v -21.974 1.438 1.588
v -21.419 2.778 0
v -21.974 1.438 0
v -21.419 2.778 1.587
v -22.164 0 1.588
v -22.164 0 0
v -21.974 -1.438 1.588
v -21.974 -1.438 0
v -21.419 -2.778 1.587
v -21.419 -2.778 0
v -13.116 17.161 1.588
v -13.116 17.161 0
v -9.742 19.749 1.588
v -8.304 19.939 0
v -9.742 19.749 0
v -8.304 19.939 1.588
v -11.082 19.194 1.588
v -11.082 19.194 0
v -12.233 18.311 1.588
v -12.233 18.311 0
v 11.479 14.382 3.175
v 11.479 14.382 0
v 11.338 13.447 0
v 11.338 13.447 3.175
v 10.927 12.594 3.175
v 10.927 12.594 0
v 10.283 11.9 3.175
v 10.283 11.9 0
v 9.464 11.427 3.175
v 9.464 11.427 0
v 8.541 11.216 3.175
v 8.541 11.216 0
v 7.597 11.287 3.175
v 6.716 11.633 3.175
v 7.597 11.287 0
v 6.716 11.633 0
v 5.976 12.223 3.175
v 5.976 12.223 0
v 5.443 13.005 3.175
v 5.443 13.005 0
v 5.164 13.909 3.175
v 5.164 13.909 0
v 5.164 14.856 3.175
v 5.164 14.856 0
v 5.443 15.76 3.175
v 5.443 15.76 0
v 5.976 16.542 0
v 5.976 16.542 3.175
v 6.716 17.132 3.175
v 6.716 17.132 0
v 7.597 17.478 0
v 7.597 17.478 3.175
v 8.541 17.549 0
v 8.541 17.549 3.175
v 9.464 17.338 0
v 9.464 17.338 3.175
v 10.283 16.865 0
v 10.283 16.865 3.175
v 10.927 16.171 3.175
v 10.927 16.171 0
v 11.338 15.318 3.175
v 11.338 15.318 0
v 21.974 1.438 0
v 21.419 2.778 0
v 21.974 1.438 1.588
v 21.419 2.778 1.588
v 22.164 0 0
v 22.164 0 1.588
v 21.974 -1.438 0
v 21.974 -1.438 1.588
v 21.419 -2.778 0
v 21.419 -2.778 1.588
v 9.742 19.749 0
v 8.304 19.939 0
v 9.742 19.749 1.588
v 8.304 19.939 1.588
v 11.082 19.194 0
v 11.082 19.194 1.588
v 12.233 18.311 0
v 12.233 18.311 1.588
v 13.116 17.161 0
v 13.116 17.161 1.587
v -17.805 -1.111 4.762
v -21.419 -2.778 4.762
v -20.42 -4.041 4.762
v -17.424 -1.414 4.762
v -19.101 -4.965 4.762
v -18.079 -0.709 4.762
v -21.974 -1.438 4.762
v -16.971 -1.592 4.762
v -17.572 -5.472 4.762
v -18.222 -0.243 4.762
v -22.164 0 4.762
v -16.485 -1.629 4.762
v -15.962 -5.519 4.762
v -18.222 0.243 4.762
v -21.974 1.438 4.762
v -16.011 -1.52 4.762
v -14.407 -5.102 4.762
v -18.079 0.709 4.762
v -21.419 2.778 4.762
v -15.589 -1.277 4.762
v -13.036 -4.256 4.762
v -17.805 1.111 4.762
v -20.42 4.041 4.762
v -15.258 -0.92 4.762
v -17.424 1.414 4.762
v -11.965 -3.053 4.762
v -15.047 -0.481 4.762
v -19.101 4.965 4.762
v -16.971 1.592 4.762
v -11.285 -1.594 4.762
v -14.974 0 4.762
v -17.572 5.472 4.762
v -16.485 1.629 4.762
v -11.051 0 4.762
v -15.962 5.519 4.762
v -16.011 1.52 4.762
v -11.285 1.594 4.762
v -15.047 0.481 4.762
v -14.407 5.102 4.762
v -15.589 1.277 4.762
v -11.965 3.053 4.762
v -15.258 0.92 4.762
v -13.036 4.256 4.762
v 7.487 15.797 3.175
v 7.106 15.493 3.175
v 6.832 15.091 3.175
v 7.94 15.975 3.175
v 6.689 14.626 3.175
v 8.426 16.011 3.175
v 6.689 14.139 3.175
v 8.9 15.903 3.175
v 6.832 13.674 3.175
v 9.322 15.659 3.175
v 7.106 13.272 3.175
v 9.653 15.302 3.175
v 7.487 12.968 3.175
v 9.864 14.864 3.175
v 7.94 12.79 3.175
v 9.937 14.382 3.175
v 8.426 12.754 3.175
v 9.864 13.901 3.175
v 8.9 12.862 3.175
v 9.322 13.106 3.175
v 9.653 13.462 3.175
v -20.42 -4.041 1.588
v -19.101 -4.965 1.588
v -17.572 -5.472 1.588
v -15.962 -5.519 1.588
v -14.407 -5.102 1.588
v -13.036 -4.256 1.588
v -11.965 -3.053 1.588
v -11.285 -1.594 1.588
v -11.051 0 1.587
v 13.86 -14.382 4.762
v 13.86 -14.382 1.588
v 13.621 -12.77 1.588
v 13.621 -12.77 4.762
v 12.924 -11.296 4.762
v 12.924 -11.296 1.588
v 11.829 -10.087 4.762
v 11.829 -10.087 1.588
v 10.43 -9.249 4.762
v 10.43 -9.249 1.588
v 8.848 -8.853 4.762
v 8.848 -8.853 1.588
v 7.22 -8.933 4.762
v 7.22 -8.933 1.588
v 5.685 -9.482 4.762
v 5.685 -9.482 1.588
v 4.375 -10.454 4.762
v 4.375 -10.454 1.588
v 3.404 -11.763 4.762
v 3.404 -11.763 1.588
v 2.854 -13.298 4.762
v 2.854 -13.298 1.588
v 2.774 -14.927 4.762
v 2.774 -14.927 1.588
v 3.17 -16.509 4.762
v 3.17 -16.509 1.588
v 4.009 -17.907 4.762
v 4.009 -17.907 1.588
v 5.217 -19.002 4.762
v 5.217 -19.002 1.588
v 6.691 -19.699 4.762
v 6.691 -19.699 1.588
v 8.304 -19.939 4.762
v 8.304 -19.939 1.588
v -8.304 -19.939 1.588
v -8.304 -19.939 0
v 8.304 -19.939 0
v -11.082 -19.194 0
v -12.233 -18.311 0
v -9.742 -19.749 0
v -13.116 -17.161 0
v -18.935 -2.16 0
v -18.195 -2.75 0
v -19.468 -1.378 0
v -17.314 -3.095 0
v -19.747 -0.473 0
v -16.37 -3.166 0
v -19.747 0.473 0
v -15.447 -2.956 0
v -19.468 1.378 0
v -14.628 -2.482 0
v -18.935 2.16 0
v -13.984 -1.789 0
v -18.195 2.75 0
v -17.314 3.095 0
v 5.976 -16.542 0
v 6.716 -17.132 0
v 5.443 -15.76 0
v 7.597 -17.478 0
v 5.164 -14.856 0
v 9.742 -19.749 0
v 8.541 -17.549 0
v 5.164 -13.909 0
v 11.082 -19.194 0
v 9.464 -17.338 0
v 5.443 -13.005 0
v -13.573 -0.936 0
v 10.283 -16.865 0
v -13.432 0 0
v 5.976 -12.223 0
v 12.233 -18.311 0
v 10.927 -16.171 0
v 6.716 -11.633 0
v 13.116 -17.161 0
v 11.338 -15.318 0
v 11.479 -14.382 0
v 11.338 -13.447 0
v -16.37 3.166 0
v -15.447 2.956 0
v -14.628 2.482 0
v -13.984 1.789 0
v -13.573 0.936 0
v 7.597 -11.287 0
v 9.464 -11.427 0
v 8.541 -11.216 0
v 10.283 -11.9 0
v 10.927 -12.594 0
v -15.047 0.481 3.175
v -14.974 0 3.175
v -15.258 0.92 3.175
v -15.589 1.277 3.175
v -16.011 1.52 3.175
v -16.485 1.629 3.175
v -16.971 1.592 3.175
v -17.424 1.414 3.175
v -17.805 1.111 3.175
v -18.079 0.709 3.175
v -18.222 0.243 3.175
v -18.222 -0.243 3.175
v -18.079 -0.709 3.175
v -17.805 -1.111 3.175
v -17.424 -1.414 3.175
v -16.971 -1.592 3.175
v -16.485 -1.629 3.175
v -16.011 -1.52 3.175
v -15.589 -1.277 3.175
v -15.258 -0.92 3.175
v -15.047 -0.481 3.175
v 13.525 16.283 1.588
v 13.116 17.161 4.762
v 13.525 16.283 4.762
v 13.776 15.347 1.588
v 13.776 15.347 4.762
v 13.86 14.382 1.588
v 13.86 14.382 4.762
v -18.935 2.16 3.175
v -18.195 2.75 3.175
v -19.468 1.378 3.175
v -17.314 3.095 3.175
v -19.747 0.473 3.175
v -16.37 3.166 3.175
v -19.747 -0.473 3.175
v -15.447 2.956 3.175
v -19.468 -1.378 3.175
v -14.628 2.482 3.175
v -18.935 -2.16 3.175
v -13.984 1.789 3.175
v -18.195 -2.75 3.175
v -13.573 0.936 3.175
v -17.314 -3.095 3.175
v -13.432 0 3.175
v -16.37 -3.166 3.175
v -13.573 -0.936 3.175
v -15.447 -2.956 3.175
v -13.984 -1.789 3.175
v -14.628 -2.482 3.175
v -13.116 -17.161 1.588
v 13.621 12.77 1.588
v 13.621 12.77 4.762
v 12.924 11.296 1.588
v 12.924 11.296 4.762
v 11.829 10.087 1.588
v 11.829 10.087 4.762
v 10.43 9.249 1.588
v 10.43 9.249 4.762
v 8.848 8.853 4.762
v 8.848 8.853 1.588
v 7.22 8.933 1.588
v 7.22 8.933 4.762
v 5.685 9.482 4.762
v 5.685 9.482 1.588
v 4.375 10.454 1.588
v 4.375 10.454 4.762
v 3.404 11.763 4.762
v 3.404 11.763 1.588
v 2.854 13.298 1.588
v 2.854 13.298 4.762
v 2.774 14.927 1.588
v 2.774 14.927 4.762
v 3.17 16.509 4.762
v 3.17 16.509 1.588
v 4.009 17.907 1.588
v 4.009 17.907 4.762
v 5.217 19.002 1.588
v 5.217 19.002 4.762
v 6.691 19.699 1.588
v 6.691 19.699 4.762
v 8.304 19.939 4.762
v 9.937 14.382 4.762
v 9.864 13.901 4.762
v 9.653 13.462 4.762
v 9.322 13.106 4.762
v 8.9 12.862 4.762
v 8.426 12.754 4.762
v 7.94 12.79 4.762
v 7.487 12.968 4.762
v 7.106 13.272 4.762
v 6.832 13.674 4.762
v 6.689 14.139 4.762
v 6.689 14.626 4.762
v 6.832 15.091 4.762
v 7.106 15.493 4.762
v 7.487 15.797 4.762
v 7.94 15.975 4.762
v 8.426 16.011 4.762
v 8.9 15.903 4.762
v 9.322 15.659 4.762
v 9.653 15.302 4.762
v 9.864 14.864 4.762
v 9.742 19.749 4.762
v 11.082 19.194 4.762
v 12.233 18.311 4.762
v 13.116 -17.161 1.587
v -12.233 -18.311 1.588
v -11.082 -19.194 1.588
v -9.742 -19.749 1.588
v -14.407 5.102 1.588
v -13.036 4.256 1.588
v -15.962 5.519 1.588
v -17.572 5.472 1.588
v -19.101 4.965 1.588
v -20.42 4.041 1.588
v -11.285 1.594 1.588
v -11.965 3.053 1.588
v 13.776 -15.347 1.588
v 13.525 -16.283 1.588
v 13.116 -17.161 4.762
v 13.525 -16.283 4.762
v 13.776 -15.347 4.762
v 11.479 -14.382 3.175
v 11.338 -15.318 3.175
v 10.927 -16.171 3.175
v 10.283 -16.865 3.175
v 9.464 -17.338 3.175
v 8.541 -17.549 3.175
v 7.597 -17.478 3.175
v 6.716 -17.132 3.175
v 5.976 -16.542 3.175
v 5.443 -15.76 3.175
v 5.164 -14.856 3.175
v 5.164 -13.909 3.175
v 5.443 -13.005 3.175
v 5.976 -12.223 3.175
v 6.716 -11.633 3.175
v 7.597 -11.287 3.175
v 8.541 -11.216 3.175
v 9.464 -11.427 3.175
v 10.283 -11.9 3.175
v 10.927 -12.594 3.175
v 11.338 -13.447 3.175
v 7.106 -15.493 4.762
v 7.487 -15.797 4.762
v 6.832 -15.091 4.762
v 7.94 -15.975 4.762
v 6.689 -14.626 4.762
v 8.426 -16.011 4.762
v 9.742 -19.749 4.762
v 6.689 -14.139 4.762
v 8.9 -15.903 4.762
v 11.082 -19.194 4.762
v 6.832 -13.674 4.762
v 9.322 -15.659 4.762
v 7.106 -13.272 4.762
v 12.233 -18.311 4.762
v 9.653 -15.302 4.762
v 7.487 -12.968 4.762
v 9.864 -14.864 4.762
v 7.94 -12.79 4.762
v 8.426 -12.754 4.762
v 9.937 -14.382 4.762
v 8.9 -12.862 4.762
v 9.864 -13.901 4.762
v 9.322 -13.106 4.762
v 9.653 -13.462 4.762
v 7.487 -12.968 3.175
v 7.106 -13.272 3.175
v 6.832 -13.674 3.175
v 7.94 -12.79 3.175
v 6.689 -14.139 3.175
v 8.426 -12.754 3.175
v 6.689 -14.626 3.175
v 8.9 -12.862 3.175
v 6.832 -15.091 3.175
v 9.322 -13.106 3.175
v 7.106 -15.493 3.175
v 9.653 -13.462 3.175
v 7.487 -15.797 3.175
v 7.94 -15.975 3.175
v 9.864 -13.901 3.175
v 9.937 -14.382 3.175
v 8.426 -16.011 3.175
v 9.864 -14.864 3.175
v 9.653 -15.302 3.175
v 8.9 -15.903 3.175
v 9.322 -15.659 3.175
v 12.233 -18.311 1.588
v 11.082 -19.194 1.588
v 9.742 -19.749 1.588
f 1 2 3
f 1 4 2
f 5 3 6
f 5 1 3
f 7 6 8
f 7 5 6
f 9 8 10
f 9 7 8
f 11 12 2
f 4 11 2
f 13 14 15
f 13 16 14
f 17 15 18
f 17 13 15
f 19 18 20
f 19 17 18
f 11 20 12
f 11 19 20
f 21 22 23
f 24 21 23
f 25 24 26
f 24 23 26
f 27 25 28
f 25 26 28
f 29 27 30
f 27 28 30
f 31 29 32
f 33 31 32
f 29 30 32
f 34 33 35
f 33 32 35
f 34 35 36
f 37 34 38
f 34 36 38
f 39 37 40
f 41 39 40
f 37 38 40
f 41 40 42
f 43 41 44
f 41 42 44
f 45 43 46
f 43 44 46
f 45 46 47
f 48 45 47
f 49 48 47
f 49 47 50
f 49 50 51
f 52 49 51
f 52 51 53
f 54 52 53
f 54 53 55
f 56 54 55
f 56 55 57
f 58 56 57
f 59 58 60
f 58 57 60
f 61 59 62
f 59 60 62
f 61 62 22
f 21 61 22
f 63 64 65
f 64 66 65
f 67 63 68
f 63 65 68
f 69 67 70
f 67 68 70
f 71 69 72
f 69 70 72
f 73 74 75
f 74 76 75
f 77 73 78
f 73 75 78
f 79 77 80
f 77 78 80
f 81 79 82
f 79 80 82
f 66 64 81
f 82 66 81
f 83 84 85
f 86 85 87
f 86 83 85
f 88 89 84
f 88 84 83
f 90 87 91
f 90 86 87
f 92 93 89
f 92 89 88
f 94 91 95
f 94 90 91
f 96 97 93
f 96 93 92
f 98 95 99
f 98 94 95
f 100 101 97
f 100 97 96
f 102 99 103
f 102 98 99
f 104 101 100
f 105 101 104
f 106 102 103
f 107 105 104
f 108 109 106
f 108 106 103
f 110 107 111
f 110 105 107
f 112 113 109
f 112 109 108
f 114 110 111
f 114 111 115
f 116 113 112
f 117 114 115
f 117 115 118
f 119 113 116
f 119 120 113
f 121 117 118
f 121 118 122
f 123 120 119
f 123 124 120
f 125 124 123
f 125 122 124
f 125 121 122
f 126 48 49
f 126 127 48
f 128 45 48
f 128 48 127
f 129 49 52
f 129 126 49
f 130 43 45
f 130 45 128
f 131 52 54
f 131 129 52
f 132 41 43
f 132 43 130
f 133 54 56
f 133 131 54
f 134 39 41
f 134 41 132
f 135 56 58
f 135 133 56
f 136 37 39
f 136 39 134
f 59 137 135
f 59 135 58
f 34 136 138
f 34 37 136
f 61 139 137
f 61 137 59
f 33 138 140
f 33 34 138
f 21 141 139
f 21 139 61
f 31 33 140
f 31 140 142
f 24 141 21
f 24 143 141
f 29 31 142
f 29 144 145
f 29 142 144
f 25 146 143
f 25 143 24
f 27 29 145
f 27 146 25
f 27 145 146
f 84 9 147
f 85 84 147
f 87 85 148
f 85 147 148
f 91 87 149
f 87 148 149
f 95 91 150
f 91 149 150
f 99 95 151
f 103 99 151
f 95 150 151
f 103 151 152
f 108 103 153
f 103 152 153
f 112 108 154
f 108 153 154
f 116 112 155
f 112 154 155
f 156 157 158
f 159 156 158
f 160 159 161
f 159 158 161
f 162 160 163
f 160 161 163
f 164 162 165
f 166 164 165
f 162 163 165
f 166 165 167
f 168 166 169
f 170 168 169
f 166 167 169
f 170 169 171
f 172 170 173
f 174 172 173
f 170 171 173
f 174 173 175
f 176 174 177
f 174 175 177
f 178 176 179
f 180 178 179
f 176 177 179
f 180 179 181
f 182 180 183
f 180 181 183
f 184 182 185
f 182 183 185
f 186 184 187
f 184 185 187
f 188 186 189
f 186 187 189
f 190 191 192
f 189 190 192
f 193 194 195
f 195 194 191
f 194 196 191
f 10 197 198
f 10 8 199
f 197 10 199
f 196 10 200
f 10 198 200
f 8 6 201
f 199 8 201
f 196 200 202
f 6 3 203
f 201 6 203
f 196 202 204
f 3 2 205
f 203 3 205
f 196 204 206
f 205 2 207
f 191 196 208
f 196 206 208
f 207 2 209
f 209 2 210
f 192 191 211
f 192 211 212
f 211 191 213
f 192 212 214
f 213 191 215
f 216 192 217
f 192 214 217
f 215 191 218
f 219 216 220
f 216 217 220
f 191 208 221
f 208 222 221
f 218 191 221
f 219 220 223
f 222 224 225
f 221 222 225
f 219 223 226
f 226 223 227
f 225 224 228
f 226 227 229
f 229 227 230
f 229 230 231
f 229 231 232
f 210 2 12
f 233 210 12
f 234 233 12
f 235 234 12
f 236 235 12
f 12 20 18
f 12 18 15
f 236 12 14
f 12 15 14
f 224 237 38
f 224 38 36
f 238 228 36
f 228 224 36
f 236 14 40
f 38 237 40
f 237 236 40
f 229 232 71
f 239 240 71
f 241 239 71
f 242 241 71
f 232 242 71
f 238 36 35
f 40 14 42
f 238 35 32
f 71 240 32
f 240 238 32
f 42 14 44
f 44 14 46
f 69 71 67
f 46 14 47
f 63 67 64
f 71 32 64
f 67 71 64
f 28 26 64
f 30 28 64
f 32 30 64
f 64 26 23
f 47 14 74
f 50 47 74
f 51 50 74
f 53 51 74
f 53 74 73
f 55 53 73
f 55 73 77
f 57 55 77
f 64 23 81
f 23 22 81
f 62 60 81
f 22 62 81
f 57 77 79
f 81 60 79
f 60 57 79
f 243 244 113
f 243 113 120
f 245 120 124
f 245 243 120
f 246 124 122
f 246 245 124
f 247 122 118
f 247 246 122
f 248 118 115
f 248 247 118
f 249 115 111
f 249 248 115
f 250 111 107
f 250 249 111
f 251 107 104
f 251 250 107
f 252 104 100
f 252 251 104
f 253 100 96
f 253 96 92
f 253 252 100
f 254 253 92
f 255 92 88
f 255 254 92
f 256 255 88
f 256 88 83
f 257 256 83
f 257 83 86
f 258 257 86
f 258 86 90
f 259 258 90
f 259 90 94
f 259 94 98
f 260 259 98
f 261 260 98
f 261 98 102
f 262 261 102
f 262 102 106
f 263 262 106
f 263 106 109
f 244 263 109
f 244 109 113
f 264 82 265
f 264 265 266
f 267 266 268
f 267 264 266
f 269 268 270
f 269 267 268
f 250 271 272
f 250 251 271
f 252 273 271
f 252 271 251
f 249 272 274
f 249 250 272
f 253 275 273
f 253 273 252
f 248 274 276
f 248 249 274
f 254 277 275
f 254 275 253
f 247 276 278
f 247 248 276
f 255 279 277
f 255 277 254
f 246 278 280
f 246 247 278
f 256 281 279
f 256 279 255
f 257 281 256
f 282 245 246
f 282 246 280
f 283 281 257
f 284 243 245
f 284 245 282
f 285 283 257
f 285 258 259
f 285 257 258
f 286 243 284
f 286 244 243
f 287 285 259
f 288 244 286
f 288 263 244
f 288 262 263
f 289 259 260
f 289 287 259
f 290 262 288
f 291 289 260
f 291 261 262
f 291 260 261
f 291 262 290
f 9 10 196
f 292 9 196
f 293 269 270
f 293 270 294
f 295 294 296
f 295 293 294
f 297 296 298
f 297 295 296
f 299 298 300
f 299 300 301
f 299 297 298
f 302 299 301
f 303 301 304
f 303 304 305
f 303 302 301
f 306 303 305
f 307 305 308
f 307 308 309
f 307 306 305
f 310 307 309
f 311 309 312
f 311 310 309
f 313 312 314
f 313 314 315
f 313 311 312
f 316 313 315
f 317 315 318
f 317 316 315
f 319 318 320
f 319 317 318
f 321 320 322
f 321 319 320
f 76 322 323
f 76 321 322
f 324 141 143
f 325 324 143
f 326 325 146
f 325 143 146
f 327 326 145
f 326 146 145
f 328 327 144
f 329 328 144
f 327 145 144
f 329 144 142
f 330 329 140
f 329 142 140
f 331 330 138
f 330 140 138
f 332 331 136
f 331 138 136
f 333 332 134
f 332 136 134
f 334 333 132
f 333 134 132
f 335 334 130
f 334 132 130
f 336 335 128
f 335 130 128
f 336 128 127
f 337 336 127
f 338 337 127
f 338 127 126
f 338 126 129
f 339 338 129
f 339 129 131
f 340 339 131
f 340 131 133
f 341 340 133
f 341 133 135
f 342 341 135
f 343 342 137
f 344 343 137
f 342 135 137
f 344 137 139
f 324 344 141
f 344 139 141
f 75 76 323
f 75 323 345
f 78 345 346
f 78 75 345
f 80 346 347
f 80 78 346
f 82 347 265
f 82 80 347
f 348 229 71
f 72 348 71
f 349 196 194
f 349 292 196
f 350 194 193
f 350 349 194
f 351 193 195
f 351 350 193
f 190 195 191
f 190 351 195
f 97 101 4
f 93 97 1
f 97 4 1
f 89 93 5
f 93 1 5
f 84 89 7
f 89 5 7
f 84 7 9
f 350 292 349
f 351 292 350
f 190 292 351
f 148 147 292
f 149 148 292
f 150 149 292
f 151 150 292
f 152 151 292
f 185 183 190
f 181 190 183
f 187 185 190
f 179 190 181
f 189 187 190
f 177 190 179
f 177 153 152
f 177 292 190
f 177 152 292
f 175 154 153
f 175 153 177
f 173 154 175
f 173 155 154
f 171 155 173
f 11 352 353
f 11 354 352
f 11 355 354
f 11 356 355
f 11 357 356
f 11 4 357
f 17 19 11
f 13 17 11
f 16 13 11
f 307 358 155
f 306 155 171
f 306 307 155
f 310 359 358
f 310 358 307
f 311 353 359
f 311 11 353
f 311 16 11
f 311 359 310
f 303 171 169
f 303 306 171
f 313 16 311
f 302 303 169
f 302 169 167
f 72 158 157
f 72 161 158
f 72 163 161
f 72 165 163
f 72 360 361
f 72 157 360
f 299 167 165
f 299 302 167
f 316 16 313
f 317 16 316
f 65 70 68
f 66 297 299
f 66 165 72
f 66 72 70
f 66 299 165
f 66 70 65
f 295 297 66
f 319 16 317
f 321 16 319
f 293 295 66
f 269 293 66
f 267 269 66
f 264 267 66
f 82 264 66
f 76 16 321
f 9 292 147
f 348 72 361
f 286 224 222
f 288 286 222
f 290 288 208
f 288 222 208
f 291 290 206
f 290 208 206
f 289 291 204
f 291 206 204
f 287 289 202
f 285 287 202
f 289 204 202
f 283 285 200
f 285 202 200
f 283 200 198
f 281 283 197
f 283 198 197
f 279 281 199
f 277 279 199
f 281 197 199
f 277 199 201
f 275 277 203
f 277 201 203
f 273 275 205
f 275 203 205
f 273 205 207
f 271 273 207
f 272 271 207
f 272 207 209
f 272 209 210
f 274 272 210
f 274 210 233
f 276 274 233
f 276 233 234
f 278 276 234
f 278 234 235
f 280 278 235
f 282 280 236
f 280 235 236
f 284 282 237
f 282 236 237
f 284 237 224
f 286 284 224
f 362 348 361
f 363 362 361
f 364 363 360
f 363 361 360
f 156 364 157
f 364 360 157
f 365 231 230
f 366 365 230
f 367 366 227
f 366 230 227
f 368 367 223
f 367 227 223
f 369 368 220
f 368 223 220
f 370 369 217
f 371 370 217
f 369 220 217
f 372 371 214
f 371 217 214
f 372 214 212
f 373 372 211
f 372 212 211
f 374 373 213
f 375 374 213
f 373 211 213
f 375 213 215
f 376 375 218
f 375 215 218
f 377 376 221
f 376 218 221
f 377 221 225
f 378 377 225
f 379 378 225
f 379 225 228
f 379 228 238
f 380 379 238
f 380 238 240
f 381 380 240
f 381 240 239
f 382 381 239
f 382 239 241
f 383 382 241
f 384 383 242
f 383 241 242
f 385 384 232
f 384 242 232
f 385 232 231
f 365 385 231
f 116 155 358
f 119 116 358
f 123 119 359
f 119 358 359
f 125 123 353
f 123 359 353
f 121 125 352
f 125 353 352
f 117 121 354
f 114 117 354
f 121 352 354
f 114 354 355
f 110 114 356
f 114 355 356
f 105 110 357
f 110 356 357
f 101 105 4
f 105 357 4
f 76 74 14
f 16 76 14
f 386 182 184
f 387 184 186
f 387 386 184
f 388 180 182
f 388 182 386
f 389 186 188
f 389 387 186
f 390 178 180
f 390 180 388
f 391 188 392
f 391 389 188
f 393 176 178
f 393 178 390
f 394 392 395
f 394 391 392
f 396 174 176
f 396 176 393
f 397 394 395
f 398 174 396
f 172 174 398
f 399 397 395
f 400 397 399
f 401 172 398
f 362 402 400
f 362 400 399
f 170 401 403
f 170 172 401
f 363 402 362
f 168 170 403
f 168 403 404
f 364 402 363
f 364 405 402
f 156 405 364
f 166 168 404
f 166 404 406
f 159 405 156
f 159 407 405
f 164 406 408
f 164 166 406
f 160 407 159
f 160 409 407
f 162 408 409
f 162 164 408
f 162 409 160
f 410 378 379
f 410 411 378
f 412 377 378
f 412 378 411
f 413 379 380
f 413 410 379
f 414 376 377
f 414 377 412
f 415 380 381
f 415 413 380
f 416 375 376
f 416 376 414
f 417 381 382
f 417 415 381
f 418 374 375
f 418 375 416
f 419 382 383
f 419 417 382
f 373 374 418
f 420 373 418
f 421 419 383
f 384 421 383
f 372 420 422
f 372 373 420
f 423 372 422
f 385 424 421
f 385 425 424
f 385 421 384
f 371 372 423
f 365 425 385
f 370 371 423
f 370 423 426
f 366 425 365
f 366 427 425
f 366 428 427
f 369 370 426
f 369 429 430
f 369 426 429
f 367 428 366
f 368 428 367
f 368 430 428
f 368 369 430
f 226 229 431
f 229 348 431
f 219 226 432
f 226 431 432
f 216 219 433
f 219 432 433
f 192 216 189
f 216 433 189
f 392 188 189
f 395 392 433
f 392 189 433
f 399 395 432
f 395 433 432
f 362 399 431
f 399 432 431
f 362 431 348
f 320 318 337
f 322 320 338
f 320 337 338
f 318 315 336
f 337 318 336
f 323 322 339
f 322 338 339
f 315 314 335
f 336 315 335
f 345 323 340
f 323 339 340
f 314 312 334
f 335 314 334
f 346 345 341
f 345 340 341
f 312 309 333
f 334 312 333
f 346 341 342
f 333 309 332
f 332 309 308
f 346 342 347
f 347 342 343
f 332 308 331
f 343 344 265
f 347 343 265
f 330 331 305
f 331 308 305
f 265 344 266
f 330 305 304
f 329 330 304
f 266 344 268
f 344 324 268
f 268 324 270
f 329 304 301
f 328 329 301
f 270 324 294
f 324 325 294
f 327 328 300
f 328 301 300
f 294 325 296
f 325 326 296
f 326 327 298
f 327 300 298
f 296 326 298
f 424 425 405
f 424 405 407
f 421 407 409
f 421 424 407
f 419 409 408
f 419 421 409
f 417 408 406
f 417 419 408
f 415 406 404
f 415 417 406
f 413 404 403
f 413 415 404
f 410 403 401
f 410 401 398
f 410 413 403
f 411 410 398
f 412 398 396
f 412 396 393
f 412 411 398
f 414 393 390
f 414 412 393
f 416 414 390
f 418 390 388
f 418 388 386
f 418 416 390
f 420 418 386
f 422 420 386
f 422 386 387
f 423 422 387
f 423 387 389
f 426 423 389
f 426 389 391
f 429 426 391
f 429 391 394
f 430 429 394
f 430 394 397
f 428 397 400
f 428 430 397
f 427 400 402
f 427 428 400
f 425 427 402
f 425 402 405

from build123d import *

# Parameters (mm, degrees)
F0_R     = 1.63322
F1_DEPTH = 1.5875
F2_R     = 5.55625
F3_R     = 1.63322
F4_DEPTH = 3.175
F6_R     = 3.175
F7_DEPTH = 3.175


# Not quite as in the source:
# - after a boolean that leaves OpenCascade's solid faulty, fix() repairs it
# - a pattern or mirror of a feature is missing from the dataset's text; its kind, count and spacing are read off the source's solid


with BuildPart() as f1:
    # F0 (on Top) → F1 (new body)
    with BuildSketch(Plane.XY):
        Polygon((11.5116069332, 19.938688085), (-11.5116069332, 19.938688085), (-23.0232138664, 0), (-11.5116069332, -19.938688085), (11.5116069332, -19.938688085), (23.0232138664, 0), align=None)
        with Locations((8.3037045, -14.382438085)):
            Circle(F0_R, mode=Mode.SUBTRACT)
        with Locations((-16.607409, 0)):
            Circle(F0_R, mode=Mode.SUBTRACT)
        with Locations((8.3037045, 14.382438085)):
            Circle(F0_R, mode=Mode.SUBTRACT)
    extrude(amount=F1_DEPTH)

    # F2
    f2_edges = [f1.edges().sort_by_distance(p)[0] for p in [
        (-23.023214, 0, 0.79375),
        (-11.511607, -19.938688, 0.79375),
        (11.511607, -19.938688, 0.79375),
        (23.023214, 0, 0.79375),
        (11.511607, 19.938688, 0.79375),
        (-11.511607, 19.938688, 0.79375),
    ]]
    fillet(f2_edges, radius=F2_R)

    # F3 (on face) → F4 (join)
    with BuildSketch(Plane.XY.offset(1.5875)):
        with BuildLine():
            ThreePointArc((13.1155581498, -17.160563085), (13.6706298723, -15.8205014044), (13.8599545, -14.382438085))
            ThreePointArc((13.8599545, -14.382438085), (4.374842447, -10.4535760321), (8.3037045, -19.938688085))
            ThreePointArc((8.3037045, -19.938688085), (11.0818295, -19.1942917348), (13.1155581498, -17.160563085))
        make_face()
        with Locations((8.3037045, -14.382438085)):
            Circle(F3_R, mode=Mode.SUBTRACT)
        with BuildLine():
            ThreePointArc((-21.4192626498, 2.778125), (-22.163659, 0), (-21.4192626498, -2.778125))
            ThreePointArc((-21.4192626498, -2.778125), (-15.1693456806, -5.3669253723), (-11.051159, 0))
            ThreePointArc((-11.051159, 0), (-15.1693456806, 5.3669253723), (-21.4192626498, 2.778125))
        make_face()
        with Locations((-16.607409, 0)):
            Circle(F3_R, mode=Mode.SUBTRACT)
    f4 = extrude(amount=F4_DEPTH)

    # F4_copies: F4 across plane
    add(f4.mirror(Plane.ZX))

    add(f1.part.fix(), mode=Mode.REPLACE)

    # F6 (on face) → F7 (cut, through all)
    with BuildSketch(Plane(origin=(0, 0, 0), x_dir=(1, 0, 0), z_dir=(0, 0, -1))):
        with Locations((8.3037045, 14.382438085)):
            Circle(F6_R)
        with Locations((8.3037045, -14.382438085)):
            Circle(F6_R)
        with Locations((-16.607409, 0)):
            Circle(F6_R)
    extrude(amount=-F7_DEPTH, mode=Mode.SUBTRACT)


solid = f1.part
